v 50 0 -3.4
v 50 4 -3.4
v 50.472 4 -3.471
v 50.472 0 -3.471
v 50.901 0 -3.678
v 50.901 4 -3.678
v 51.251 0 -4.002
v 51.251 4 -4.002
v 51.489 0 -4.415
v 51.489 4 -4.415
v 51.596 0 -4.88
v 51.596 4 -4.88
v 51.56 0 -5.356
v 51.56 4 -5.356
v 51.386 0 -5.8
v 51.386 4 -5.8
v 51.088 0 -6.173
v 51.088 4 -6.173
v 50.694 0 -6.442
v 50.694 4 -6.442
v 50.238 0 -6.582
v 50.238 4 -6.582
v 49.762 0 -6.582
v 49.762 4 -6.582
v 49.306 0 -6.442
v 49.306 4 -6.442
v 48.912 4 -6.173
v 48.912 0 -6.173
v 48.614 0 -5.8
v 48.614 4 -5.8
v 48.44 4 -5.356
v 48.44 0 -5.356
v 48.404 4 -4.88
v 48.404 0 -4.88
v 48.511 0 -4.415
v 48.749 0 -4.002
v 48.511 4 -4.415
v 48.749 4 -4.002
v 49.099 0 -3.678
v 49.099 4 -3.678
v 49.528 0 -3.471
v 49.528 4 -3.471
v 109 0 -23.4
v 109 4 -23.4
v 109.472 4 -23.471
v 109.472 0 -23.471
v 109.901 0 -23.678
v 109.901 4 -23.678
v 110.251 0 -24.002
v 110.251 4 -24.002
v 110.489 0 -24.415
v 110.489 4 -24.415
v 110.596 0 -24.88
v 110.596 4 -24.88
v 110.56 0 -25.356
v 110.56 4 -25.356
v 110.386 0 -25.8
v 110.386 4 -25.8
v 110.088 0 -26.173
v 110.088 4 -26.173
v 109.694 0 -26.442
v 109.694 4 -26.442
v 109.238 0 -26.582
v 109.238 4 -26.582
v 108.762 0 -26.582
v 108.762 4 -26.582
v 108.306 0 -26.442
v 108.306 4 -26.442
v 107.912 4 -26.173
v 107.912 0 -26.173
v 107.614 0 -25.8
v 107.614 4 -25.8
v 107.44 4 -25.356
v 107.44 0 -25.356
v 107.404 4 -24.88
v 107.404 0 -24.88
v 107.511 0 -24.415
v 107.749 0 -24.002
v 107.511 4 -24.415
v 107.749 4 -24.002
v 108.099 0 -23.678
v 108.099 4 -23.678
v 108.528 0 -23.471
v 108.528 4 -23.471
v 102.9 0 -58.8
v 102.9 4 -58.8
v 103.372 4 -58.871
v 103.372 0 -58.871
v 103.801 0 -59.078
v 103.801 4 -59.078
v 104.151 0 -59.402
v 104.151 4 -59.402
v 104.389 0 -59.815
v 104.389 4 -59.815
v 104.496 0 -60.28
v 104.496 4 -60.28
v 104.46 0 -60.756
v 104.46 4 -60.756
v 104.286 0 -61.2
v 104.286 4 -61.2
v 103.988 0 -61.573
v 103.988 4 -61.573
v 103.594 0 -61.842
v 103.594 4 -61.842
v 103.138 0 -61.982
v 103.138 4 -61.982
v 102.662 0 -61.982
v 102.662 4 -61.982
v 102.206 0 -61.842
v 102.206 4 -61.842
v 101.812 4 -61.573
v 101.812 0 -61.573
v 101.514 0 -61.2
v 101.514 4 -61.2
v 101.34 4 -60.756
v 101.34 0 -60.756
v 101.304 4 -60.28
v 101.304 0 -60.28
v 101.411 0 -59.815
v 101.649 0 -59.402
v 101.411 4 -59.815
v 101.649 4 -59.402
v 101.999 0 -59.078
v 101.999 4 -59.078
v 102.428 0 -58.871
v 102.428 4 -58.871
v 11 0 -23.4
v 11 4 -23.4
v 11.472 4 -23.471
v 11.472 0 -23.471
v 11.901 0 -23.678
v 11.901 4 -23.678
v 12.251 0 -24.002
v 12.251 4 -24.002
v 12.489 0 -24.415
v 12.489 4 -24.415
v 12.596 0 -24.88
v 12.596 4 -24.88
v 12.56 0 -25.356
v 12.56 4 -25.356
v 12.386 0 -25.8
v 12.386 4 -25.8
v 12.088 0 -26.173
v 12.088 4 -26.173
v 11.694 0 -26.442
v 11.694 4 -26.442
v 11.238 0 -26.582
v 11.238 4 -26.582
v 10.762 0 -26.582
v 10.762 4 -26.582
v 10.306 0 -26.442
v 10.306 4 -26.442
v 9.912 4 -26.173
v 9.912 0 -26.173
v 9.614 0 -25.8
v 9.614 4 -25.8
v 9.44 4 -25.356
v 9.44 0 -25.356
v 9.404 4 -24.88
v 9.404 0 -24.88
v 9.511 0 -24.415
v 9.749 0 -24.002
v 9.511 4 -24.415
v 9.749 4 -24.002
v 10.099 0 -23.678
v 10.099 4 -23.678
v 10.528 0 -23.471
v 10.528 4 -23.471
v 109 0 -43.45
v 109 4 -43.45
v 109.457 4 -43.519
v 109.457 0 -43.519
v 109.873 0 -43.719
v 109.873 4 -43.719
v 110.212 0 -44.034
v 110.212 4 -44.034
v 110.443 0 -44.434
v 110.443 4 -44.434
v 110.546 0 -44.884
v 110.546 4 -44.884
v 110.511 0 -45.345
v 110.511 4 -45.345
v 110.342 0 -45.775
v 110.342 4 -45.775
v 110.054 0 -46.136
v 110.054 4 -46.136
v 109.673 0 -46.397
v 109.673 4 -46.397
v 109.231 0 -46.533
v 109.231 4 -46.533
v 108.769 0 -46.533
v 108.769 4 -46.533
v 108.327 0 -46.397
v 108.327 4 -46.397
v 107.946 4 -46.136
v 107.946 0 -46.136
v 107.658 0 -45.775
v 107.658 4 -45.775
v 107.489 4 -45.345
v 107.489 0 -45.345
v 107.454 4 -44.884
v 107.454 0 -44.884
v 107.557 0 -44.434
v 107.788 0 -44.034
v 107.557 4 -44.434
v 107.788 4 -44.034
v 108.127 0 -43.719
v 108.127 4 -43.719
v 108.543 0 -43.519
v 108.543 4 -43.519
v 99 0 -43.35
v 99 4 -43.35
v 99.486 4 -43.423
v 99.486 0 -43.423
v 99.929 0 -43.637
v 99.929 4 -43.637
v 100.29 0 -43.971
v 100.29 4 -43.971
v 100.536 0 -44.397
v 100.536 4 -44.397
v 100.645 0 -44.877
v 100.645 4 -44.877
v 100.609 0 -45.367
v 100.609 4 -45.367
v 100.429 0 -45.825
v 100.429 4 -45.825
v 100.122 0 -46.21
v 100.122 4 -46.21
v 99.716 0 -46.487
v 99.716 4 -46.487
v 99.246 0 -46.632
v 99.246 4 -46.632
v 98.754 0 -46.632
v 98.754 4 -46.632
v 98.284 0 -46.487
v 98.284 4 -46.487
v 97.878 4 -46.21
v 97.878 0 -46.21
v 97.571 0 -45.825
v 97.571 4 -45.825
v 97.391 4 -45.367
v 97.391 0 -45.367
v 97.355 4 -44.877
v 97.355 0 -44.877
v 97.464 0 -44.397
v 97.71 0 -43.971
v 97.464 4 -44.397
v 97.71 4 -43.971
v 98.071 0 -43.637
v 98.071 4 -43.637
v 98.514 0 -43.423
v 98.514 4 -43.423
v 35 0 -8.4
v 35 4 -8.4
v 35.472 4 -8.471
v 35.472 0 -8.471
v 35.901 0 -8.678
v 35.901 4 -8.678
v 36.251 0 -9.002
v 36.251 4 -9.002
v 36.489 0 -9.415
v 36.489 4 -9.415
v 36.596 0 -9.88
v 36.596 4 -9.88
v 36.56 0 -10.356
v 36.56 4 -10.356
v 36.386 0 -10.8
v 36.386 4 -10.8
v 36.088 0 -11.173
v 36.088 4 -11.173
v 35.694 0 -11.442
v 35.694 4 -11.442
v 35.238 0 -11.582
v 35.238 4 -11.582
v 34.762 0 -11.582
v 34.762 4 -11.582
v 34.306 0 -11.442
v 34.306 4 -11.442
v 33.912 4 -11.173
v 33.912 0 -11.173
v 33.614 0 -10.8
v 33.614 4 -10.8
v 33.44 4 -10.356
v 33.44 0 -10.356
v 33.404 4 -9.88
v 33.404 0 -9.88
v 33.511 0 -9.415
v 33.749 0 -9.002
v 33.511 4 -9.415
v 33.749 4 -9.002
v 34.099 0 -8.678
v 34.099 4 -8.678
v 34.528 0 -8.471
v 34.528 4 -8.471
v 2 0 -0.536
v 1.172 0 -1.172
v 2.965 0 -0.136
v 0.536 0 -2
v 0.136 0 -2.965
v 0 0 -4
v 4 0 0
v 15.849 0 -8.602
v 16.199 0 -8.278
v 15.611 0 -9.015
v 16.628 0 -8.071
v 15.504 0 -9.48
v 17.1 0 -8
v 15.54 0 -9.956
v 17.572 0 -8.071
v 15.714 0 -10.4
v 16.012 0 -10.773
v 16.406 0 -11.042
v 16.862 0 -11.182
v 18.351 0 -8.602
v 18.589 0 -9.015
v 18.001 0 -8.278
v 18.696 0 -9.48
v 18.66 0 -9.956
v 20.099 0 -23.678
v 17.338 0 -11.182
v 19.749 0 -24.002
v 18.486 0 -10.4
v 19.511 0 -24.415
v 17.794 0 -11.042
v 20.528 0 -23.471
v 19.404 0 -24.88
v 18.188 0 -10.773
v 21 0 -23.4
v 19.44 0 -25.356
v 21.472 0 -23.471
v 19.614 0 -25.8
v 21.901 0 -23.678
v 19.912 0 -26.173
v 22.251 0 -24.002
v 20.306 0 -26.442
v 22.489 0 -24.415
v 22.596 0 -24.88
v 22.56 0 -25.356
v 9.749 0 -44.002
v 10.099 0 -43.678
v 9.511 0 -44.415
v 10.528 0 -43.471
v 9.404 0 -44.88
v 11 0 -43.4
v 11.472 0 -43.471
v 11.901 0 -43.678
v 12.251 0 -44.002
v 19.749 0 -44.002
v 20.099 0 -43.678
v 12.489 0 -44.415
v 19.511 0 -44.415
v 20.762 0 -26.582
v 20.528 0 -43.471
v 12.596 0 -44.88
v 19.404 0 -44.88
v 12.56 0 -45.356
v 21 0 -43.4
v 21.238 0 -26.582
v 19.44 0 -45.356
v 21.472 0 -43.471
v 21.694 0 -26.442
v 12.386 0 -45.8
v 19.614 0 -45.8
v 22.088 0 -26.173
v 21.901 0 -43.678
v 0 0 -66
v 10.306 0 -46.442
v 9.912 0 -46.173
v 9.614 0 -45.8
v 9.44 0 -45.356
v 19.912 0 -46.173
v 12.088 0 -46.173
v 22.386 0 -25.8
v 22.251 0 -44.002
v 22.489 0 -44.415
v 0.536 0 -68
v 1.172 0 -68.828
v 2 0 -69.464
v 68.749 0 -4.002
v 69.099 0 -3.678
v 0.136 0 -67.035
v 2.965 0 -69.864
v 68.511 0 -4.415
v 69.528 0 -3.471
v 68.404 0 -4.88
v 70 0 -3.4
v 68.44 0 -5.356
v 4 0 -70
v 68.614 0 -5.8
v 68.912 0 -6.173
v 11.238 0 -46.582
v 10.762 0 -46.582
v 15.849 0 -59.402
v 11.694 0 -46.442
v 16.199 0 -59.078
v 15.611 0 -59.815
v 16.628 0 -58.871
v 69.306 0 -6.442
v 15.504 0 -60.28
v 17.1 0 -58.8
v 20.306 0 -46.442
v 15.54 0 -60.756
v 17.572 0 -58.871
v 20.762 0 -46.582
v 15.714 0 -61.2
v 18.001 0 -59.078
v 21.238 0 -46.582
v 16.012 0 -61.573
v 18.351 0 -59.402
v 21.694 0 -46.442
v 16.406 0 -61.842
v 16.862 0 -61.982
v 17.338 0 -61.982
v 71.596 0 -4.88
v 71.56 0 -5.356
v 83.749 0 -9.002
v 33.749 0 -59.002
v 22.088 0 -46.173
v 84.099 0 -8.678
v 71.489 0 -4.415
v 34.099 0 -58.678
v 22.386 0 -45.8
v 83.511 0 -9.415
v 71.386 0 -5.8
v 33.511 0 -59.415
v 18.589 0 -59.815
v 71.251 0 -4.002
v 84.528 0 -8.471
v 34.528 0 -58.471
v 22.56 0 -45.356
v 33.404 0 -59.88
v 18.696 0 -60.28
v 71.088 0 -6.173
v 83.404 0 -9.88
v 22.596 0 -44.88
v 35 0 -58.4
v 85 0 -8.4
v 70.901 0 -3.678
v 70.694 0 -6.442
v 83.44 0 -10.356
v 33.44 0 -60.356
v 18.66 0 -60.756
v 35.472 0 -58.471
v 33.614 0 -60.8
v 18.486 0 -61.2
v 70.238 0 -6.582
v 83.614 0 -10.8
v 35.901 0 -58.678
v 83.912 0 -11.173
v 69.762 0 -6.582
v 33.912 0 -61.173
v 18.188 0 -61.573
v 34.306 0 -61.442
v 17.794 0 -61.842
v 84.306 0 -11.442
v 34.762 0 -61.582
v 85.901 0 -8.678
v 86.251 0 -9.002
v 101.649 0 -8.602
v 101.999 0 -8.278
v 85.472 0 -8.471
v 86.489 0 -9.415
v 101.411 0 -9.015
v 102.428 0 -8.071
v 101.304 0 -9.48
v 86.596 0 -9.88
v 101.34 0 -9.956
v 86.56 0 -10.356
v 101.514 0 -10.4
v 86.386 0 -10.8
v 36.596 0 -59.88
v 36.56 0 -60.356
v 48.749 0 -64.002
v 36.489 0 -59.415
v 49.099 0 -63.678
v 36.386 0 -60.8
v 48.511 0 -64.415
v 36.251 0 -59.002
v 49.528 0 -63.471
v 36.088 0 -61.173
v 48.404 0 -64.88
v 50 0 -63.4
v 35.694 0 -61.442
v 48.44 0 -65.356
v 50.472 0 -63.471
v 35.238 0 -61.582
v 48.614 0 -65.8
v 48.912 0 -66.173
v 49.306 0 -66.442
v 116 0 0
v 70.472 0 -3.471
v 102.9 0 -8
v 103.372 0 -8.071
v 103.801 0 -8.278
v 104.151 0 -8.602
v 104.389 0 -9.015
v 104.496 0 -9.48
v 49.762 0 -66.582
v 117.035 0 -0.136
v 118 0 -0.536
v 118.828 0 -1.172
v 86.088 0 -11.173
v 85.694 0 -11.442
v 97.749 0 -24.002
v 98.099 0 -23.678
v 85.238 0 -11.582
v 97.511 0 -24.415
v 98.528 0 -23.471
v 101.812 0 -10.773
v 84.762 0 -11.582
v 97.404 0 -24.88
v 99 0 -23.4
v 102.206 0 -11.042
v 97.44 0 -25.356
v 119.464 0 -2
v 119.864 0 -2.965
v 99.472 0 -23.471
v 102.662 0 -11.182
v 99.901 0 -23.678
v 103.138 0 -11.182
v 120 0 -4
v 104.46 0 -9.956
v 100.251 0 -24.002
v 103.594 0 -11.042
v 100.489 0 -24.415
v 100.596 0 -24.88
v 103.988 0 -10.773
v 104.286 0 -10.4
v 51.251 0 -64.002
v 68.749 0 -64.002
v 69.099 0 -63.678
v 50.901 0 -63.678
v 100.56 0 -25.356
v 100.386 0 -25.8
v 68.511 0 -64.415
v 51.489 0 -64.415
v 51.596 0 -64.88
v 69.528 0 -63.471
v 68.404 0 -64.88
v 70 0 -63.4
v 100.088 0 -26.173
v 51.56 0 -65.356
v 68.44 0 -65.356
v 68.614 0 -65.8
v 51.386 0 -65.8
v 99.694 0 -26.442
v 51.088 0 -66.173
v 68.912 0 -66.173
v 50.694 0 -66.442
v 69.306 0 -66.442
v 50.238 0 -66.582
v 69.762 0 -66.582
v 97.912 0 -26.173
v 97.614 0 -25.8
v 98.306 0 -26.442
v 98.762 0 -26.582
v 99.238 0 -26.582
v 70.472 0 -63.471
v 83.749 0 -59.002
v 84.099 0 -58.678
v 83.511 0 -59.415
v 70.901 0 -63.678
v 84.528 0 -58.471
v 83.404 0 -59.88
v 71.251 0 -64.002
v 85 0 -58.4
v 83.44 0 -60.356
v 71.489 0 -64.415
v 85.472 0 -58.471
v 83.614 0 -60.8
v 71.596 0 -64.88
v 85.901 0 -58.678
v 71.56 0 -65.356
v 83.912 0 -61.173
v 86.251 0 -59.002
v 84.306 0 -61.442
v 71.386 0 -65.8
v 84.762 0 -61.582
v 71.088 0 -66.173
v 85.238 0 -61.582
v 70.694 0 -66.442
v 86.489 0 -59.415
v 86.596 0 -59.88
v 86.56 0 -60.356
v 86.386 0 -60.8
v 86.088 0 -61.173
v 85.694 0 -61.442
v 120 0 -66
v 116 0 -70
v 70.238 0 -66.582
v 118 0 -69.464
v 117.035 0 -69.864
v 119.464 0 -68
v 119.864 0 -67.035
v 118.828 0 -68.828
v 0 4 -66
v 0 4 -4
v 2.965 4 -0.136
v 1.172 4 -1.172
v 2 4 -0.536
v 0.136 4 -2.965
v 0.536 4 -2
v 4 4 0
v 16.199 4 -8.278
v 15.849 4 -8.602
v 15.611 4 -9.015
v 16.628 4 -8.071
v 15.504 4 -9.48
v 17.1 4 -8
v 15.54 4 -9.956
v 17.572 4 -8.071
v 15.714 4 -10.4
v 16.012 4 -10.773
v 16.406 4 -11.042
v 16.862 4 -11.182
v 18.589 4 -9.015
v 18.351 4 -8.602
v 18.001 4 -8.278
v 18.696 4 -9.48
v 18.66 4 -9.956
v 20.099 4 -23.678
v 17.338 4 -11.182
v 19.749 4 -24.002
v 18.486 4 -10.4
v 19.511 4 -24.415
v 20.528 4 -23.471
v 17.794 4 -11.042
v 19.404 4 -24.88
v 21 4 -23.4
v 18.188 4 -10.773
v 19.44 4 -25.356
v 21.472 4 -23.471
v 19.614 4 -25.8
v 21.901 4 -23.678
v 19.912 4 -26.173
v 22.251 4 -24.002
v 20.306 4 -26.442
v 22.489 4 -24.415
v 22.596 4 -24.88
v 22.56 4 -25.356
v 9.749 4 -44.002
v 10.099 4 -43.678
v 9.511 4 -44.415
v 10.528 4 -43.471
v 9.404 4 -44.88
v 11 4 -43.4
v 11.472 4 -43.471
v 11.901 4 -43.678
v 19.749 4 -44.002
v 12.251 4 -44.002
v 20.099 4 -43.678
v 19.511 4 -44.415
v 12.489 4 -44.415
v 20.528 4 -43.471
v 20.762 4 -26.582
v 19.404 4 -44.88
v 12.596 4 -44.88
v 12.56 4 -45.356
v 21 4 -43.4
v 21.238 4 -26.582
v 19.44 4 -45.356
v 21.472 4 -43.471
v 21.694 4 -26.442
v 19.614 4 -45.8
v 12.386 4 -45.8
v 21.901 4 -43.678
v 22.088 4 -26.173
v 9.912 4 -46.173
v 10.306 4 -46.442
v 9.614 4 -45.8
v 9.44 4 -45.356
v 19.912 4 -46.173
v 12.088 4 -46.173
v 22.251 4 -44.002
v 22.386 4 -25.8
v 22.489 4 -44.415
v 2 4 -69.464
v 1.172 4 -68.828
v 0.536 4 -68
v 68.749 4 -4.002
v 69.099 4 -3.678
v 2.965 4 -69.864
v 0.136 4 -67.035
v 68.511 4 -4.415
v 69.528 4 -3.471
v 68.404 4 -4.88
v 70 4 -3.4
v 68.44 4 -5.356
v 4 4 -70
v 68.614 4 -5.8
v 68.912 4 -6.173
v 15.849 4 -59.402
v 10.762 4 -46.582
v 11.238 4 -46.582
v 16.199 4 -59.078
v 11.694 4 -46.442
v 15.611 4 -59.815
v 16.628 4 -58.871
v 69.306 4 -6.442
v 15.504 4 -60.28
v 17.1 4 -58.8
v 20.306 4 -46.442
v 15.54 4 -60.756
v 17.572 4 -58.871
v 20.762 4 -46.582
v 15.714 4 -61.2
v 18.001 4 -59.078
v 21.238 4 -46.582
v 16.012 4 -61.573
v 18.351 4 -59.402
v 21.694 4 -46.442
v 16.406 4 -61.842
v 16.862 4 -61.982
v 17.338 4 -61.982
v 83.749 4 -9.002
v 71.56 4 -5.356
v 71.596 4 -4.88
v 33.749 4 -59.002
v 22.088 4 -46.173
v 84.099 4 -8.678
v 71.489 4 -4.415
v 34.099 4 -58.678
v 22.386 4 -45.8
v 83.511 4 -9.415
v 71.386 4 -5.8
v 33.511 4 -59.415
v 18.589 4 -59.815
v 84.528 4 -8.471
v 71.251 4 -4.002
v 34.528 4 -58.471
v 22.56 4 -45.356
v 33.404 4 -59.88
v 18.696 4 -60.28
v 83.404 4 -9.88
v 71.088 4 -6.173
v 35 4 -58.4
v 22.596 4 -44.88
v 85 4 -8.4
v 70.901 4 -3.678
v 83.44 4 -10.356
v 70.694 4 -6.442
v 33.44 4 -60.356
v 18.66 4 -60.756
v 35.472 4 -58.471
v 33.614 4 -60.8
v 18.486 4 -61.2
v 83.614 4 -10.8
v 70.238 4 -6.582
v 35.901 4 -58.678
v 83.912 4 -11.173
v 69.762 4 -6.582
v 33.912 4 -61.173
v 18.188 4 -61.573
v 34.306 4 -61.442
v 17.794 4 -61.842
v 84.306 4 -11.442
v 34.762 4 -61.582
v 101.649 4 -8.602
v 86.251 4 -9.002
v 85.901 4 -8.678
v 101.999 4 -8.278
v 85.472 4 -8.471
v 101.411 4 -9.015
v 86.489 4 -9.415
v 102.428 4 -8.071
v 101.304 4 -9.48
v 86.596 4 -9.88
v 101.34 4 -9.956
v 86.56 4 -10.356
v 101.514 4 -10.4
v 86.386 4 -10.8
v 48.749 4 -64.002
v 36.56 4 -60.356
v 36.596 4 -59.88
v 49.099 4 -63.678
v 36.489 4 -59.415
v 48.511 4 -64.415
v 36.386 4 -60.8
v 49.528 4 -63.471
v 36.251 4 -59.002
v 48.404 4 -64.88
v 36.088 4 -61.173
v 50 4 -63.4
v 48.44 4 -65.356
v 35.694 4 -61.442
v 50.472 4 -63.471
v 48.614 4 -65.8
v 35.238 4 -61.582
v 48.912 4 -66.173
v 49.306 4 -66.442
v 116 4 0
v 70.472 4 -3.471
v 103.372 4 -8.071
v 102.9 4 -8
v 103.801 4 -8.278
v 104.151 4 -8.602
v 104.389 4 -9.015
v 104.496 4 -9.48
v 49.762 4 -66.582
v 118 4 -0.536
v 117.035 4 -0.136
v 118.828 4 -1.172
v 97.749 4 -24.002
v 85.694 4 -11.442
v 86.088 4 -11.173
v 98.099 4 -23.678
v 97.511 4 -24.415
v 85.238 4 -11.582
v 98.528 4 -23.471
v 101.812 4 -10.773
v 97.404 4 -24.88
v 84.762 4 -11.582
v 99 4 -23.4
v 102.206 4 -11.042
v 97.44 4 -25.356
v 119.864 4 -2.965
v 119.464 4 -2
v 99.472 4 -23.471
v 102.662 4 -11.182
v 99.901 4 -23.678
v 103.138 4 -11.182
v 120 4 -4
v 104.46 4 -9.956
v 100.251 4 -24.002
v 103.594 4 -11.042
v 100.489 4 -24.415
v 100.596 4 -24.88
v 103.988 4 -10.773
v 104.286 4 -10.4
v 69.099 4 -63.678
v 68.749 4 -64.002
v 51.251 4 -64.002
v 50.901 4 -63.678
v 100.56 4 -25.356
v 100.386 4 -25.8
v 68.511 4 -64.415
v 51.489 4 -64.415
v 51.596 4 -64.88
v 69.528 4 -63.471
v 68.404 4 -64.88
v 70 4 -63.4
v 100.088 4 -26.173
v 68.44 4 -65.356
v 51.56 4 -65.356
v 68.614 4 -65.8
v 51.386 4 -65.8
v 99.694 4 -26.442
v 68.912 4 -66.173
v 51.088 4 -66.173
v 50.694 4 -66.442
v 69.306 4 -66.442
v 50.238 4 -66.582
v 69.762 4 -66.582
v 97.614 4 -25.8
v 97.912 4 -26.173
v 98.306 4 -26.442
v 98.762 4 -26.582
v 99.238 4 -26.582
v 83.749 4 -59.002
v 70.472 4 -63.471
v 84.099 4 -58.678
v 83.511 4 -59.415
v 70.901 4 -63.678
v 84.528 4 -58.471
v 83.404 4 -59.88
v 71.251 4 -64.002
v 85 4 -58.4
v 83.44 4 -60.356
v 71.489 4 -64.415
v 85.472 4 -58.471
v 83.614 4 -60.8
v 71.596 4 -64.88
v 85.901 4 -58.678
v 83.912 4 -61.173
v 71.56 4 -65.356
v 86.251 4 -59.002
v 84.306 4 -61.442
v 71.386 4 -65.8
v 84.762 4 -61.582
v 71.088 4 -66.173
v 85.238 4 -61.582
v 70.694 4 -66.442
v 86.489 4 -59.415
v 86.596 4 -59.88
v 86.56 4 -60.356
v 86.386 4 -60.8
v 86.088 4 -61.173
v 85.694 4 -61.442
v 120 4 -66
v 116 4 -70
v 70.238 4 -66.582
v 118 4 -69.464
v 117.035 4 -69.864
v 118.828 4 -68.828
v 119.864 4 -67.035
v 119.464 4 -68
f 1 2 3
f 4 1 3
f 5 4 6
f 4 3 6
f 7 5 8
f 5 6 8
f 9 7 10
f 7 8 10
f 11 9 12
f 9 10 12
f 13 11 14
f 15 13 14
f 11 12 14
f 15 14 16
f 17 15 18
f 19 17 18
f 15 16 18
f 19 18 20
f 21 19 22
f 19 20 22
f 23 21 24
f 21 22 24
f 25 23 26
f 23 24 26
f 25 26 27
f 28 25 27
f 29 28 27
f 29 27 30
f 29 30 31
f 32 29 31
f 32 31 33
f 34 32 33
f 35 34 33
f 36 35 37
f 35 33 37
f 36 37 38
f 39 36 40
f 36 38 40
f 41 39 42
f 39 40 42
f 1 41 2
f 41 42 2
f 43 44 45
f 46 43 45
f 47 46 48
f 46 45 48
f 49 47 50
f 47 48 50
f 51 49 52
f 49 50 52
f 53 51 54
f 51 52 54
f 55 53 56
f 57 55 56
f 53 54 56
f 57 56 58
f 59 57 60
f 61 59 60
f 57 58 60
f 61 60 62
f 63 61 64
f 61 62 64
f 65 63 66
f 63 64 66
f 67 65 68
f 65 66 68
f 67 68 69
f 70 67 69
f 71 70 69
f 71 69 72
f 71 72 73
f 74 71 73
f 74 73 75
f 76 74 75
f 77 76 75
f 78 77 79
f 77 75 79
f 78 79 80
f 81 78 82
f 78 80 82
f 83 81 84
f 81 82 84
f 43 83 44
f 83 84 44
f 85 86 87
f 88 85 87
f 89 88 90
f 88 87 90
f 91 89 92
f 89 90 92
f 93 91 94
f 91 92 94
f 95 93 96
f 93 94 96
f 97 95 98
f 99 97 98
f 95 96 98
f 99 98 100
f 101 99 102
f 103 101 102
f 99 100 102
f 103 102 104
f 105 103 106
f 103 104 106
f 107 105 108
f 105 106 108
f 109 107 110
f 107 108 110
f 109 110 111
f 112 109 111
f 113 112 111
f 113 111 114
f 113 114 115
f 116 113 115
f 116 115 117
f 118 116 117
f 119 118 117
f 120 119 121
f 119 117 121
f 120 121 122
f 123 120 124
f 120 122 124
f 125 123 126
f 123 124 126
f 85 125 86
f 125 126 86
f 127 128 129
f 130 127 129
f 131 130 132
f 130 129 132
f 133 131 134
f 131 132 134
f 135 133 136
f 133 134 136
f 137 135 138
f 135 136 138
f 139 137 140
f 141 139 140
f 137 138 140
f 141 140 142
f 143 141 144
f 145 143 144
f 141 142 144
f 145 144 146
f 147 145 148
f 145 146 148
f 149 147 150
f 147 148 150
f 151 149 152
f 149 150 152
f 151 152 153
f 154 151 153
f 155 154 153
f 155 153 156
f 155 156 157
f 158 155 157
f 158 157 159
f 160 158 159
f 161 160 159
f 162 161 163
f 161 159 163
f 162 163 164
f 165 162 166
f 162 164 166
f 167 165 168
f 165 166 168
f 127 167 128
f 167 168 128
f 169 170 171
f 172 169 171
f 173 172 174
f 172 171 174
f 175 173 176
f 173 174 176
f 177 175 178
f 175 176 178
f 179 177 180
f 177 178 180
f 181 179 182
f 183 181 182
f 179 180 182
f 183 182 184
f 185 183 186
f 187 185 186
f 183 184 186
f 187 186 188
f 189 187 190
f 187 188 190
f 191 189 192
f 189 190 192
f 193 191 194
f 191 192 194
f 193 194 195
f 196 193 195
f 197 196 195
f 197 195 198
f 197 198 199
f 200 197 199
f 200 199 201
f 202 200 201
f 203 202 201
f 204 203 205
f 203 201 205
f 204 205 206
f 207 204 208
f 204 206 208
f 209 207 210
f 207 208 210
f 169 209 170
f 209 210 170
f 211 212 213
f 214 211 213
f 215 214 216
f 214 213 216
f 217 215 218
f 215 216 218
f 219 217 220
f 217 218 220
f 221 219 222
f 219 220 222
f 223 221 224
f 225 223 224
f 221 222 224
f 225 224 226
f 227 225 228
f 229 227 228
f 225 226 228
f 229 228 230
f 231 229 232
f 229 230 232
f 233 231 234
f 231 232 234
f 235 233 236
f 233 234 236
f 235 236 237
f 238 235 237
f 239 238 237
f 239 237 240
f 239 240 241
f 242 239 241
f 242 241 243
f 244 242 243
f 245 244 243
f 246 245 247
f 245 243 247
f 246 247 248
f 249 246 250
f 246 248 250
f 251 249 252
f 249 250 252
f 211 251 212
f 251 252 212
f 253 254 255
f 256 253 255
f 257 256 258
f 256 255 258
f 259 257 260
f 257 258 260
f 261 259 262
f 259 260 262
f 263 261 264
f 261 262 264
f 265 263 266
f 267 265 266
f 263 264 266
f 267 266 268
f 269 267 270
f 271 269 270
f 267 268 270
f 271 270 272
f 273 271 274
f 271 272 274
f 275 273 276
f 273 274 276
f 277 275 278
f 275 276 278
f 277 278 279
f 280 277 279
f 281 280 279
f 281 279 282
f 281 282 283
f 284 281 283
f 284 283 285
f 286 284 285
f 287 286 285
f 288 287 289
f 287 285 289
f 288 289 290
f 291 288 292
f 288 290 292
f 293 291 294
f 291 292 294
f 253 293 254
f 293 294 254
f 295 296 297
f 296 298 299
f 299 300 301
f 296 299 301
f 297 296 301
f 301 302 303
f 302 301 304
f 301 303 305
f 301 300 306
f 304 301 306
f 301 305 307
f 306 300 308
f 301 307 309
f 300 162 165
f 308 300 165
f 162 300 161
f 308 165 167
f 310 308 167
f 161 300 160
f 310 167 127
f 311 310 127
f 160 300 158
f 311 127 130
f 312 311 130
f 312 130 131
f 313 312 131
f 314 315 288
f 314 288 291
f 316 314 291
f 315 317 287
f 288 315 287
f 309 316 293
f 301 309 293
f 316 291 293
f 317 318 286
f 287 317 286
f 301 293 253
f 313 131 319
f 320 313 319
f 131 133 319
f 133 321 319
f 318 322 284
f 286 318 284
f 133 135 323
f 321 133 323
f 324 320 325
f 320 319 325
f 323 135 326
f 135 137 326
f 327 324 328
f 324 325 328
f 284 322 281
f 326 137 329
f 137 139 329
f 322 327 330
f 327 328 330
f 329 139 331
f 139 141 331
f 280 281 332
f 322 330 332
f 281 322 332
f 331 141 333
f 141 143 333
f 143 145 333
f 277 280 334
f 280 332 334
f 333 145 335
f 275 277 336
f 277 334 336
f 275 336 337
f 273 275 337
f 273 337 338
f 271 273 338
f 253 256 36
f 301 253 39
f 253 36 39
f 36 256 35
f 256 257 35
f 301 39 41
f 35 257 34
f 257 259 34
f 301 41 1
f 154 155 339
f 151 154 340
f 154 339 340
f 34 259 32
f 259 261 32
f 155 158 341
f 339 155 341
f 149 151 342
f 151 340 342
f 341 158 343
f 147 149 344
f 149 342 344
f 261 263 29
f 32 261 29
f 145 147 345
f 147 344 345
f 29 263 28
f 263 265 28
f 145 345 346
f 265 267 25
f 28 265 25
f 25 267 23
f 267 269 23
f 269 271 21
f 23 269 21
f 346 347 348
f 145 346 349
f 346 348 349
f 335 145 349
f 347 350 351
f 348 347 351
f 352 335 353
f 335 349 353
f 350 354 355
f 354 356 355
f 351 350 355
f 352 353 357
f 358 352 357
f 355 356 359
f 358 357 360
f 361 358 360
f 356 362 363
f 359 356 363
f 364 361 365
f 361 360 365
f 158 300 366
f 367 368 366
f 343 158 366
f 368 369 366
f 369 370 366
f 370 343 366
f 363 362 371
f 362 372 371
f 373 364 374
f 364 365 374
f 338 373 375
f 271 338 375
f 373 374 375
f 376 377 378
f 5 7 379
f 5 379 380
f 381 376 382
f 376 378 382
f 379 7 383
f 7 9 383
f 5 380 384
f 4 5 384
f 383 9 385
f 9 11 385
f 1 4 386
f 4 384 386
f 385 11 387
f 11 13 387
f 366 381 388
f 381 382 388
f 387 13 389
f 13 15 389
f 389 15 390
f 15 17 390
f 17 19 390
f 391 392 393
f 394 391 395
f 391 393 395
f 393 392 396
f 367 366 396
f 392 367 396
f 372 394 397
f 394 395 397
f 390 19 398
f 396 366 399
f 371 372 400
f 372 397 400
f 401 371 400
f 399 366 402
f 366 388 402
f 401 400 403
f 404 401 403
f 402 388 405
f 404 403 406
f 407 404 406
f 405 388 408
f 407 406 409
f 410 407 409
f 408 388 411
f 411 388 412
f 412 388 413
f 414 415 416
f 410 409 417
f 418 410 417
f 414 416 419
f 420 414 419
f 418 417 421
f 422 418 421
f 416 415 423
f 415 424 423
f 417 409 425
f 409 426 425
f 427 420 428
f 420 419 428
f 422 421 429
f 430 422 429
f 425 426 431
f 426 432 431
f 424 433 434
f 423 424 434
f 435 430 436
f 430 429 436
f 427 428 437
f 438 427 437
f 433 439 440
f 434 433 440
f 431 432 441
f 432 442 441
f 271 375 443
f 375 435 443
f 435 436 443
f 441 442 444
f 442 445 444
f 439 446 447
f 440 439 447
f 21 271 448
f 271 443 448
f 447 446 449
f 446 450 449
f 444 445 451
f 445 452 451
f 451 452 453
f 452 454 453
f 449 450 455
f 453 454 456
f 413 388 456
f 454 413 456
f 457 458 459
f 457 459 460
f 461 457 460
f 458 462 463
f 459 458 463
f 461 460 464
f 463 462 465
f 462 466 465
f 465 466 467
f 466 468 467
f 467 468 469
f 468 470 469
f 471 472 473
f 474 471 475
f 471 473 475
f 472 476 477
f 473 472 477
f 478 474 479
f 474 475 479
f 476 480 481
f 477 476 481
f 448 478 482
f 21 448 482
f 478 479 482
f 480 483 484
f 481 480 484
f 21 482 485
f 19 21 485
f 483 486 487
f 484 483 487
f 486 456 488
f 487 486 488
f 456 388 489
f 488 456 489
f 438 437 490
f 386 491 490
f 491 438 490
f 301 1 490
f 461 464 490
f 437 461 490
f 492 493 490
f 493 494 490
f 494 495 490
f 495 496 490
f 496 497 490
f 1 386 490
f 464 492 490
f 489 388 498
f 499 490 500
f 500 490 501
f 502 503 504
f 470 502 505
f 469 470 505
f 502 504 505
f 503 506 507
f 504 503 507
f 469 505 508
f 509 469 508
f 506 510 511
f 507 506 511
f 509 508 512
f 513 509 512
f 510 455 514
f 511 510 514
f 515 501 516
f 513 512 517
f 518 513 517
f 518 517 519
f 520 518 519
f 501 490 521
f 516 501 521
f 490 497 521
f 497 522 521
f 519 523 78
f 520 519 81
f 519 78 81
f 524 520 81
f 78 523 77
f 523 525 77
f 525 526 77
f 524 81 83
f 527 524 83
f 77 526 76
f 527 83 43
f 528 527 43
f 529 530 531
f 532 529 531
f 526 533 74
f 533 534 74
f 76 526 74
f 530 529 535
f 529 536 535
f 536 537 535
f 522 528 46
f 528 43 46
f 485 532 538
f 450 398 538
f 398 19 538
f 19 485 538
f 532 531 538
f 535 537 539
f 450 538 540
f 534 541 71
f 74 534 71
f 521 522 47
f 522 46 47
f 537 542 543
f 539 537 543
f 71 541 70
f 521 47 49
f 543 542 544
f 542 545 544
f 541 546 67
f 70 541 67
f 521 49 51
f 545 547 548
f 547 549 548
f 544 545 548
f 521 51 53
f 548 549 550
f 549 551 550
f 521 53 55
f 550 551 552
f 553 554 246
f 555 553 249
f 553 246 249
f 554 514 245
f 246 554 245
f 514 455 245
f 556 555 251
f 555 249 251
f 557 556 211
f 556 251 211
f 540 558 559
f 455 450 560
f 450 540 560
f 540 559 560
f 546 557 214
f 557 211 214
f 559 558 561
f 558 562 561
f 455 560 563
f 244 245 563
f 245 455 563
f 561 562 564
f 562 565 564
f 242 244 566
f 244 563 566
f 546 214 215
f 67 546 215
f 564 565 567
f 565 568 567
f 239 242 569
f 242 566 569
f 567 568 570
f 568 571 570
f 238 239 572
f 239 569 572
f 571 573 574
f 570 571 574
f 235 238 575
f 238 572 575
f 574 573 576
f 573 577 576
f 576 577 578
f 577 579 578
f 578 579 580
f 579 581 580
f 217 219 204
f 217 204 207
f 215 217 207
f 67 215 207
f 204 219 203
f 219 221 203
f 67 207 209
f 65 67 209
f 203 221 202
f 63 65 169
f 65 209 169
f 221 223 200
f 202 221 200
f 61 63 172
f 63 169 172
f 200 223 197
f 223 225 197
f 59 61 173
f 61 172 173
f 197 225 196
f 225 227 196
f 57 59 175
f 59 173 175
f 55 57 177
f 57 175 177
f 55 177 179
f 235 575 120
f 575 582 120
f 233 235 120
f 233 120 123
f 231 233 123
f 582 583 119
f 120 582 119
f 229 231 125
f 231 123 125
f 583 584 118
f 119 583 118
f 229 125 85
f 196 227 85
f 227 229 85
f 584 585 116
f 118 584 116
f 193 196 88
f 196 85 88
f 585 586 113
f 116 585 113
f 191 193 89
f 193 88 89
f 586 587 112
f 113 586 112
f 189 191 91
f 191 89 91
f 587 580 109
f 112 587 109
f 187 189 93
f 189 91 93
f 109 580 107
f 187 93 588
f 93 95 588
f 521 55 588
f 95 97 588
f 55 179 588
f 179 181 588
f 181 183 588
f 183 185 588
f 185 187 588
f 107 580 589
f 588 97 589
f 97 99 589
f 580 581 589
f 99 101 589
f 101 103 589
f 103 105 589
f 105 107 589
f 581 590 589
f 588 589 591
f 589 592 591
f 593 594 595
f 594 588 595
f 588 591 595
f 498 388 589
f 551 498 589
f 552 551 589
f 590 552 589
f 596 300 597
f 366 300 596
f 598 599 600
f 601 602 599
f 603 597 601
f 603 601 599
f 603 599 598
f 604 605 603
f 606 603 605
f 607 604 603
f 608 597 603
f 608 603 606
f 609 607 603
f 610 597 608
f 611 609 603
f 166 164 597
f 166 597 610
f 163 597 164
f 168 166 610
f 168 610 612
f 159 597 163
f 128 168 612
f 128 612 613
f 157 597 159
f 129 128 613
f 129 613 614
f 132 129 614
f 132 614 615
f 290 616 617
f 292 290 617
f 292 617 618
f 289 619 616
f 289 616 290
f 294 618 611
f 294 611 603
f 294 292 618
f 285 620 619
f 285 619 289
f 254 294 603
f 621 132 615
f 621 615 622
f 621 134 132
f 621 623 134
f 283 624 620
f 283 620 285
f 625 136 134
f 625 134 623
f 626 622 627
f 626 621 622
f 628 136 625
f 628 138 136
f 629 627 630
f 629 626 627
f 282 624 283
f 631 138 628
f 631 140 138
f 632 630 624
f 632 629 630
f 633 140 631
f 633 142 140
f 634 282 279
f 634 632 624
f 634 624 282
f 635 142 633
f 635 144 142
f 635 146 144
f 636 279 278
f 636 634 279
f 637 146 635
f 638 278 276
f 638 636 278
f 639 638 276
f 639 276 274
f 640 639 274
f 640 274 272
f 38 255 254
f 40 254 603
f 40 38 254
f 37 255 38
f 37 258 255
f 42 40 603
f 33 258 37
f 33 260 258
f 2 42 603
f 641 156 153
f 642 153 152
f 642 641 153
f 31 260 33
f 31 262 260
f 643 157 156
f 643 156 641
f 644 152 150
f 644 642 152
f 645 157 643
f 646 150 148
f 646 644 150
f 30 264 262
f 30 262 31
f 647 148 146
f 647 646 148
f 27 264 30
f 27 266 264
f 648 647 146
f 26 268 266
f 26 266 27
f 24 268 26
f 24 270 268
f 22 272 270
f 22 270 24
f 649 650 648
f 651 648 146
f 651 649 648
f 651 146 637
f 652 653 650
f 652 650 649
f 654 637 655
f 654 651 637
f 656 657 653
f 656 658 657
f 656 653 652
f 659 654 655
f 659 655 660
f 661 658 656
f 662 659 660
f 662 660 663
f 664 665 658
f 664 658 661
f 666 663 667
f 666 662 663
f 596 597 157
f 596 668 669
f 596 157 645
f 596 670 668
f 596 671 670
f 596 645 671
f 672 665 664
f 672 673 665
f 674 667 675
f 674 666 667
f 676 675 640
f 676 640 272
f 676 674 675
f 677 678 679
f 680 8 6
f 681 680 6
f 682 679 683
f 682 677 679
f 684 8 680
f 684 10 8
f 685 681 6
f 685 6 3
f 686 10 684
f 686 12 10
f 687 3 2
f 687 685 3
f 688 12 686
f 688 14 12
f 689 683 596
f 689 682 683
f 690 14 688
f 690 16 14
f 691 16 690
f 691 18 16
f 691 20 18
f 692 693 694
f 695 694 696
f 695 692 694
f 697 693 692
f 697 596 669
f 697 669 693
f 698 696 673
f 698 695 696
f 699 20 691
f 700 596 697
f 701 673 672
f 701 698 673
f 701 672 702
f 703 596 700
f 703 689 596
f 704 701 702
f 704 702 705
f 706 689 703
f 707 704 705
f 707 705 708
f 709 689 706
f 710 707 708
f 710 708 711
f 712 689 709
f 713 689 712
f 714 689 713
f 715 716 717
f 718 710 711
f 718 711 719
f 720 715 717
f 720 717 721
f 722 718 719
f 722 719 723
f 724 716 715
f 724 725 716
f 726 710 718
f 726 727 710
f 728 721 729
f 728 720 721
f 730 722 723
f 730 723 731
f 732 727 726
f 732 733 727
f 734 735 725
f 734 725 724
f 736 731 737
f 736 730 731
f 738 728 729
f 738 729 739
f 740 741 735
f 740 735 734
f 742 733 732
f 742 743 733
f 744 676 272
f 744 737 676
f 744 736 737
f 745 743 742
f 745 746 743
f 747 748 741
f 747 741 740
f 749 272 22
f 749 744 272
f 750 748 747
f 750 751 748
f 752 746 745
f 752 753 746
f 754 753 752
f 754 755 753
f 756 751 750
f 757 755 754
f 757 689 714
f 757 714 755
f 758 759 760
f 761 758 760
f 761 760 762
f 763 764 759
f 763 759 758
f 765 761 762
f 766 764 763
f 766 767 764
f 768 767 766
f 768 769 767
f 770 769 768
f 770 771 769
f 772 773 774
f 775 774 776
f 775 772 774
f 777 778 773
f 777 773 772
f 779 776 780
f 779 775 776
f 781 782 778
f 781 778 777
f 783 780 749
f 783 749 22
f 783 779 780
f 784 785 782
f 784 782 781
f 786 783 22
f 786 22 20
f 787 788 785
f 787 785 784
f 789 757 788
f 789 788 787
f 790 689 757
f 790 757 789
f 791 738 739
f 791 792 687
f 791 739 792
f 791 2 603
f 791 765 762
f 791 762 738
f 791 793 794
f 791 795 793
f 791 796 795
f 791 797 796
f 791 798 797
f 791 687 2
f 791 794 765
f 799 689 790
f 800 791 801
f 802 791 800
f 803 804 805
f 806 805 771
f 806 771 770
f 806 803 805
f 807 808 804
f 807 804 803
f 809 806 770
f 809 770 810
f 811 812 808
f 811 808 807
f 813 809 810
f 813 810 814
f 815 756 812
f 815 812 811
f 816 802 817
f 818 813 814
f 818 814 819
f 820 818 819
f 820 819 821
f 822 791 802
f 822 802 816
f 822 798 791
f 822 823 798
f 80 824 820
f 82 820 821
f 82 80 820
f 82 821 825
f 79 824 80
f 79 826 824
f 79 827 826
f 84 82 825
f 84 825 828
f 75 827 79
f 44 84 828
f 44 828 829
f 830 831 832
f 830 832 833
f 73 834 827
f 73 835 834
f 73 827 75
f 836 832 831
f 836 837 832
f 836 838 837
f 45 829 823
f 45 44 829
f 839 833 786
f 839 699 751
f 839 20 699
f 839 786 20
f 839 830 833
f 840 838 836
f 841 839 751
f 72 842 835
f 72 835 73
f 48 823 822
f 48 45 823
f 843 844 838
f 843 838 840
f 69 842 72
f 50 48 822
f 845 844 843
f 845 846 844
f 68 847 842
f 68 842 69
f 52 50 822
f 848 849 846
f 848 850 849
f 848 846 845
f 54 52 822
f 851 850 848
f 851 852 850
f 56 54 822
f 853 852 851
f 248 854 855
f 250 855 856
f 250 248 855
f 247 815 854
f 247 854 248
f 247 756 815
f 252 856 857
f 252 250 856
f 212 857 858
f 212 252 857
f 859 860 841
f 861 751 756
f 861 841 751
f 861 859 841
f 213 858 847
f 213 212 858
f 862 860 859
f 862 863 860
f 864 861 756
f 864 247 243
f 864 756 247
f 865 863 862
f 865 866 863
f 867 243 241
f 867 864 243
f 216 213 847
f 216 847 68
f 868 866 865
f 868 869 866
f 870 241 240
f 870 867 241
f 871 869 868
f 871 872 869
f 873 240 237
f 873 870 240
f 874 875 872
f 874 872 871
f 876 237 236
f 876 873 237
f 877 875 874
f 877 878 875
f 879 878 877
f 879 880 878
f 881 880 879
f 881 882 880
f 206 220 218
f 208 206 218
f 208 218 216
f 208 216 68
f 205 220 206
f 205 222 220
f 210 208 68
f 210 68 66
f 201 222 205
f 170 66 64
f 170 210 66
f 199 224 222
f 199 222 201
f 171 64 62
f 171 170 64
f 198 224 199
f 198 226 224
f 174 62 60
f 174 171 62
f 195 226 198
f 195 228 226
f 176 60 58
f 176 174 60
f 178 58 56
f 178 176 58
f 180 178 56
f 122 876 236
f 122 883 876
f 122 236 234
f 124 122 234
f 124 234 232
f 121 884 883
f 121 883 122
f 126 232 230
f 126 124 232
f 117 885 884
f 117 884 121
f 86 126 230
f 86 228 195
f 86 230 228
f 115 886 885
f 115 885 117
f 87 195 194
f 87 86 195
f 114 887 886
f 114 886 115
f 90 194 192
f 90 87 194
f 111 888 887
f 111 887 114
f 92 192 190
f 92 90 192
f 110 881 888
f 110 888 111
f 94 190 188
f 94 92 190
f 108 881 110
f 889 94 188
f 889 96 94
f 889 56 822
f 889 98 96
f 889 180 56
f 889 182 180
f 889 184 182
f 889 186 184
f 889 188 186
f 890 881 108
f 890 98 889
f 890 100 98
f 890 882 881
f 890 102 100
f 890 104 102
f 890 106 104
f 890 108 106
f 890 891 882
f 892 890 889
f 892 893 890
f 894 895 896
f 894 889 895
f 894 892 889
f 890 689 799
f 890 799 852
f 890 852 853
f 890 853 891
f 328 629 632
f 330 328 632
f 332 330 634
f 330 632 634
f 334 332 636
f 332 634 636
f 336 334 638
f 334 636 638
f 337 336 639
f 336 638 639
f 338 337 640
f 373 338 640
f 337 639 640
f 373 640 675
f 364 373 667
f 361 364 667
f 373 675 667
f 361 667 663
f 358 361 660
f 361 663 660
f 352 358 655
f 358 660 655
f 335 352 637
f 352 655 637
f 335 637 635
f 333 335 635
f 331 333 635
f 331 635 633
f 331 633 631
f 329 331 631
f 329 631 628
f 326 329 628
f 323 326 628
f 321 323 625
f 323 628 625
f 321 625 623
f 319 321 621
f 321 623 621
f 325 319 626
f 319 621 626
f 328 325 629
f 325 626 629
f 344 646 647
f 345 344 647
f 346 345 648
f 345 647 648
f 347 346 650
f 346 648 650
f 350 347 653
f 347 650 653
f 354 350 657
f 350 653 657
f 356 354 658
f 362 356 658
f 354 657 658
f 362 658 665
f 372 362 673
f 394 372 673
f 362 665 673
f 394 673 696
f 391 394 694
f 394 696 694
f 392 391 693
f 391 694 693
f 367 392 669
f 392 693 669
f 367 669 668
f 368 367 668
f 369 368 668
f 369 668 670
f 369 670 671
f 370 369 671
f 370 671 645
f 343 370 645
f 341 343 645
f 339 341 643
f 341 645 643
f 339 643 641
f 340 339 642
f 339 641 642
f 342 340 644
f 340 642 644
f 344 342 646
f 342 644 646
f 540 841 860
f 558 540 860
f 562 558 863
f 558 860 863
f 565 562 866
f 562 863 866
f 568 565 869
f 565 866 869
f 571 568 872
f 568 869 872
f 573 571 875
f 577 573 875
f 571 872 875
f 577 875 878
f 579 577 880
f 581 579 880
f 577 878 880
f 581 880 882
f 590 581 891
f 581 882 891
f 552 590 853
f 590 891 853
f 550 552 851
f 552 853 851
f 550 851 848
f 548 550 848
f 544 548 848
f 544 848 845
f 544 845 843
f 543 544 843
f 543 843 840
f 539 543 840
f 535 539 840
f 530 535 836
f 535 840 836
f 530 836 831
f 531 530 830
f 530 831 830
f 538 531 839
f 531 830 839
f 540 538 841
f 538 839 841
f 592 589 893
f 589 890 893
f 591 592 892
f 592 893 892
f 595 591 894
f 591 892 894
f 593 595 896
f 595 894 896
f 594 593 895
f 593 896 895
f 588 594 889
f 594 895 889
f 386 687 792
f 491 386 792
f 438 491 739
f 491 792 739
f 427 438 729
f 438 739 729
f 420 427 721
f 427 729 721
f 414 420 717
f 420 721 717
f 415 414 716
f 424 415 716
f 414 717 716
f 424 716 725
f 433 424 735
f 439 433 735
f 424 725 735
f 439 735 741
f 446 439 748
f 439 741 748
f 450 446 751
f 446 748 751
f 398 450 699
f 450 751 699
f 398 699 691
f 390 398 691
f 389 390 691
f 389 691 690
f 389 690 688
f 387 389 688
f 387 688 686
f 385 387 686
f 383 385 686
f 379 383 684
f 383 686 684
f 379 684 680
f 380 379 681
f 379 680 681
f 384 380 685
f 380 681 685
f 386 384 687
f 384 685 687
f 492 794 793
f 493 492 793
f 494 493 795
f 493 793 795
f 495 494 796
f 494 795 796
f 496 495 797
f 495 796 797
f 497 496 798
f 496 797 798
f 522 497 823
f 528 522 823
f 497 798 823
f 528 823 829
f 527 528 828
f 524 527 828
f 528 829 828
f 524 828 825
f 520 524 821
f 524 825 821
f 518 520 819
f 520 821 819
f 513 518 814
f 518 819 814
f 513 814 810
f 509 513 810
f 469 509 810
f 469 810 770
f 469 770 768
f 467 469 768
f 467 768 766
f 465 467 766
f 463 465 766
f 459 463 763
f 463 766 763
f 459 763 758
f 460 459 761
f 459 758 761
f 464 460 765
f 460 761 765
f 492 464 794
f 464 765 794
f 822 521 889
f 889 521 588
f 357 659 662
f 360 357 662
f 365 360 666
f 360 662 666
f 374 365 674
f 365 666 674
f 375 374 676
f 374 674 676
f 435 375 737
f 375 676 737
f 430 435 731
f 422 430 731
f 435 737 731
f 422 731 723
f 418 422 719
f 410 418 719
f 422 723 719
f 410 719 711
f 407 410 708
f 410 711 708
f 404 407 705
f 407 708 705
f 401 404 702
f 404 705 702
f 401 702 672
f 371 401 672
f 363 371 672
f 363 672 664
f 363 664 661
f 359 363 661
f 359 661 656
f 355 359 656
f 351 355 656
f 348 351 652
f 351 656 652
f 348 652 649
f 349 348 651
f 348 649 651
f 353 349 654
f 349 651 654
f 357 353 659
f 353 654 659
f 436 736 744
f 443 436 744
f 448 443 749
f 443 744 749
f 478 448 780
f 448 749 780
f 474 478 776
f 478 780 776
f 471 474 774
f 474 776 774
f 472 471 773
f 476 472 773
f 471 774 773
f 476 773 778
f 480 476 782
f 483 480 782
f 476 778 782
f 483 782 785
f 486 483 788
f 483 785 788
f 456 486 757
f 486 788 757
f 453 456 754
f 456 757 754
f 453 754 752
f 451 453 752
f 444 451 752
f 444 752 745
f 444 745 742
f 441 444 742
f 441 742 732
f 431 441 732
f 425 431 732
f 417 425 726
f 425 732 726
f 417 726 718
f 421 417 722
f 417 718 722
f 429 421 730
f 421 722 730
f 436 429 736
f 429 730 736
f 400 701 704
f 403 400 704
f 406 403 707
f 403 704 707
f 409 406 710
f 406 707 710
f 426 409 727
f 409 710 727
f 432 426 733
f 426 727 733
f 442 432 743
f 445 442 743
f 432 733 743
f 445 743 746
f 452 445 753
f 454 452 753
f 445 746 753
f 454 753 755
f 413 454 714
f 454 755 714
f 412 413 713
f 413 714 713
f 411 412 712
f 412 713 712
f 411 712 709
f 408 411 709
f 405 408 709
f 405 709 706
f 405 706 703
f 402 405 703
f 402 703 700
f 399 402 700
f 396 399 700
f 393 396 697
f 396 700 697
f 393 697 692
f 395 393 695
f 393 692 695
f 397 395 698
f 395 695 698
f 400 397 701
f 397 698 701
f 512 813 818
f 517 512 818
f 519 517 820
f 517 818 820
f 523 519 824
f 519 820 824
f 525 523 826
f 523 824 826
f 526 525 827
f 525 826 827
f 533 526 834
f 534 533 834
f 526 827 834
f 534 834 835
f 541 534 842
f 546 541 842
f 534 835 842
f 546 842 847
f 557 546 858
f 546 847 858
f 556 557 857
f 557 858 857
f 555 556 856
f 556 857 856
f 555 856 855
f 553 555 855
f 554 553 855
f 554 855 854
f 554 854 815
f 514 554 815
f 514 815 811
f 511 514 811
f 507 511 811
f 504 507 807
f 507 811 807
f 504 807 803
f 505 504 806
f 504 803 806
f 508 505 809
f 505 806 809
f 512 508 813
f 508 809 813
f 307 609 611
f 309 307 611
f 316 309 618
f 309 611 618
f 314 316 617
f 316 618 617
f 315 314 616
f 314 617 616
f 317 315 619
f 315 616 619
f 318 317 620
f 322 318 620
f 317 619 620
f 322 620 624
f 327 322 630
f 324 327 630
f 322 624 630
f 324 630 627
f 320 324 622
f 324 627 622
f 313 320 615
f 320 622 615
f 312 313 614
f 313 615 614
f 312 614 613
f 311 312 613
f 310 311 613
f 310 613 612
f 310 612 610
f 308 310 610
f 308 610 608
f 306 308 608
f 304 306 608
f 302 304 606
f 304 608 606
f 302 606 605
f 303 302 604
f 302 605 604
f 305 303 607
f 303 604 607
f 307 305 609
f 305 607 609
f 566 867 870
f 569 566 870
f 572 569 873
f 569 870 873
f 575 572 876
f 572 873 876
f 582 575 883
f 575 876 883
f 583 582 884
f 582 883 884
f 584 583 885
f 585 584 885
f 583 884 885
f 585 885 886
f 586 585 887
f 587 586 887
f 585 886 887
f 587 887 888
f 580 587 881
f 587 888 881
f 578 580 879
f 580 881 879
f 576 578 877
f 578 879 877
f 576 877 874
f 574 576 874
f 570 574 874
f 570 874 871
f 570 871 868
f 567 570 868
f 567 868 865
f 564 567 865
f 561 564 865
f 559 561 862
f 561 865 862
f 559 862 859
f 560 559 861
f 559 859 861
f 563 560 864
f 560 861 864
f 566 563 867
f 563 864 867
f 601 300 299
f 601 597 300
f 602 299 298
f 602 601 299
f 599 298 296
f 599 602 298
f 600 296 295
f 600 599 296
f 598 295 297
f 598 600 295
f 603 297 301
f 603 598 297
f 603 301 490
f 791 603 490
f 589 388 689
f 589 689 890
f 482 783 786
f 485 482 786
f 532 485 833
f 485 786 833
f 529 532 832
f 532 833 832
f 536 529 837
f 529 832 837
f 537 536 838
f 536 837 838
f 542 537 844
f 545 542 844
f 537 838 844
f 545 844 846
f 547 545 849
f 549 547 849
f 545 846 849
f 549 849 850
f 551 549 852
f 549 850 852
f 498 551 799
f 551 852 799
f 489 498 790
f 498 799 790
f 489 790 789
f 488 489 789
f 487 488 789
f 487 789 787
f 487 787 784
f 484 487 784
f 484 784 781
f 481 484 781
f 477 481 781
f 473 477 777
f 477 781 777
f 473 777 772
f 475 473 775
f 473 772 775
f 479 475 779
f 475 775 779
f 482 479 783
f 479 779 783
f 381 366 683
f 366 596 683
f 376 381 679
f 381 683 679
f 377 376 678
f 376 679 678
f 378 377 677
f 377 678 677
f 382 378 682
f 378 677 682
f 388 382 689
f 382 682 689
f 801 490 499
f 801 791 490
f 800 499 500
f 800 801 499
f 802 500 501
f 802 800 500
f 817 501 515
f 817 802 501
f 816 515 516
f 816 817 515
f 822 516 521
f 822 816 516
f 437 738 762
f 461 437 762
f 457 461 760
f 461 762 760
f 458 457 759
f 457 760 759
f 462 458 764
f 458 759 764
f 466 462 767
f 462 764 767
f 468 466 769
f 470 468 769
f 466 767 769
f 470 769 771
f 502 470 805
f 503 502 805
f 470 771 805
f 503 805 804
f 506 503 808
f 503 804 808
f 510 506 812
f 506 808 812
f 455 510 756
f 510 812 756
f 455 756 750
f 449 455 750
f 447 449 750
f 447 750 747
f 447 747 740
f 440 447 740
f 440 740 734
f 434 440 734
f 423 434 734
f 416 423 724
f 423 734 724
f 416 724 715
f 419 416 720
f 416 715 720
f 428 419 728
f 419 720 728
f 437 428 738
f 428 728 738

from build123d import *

# Parameters (mm, degrees)
SKETCH_1_W          = 120
SKETCH_1_H          = 70
EXTRUDE_1_DEPTH     = 4
SKETCH_2_R          = 1.6
SKETCH_2_R_2        = 1.55
SKETCH_2_R_3        = 1.65
CUT_EXTRUDE_1_DEPTH = 4
SKETCH_3_R          = 1.6
CUT_EXTRUDE_2_DEPTH = 4
FILLET_1_R          = 4


with BuildPart() as part:
    # 草图1 → 凸台-拉伸1 (new body)
    with BuildSketch(Plane(origin=(0, 0, 0), x_dir=(1, 0, 0), z_dir=(0, 1, 0))):
        with Locations((60, 35)):
            Rectangle(SKETCH_1_W, SKETCH_1_H)
    extrude(amount=EXTRUDE_1_DEPTH)

    # 草图2 → 切除-拉伸1 (cut)
    with BuildSketch(Plane(origin=(0, 4, 0), x_dir=(1, 0, 0), z_dir=(0, 1, 0))):
        with Locations(Location((11, 45, 0), (0, 0, 270))):
            Circle(SKETCH_2_R)
        with Locations(Location((21, 45, 0), (0, 0, 270))):
            Circle(SKETCH_2_R)
        with Locations(Location((21, 25, 0), (0, 0, 270))):
            Circle(SKETCH_2_R)
        with Locations(Location((11, 25, 0), (0, 0, 270))):
            Circle(SKETCH_2_R)
        with Locations(Location((109, 45, 0), (0, 0, 270))):
            Circle(SKETCH_2_R_2)
        with Locations(Location((99, 45, 0), (0, 0, 270))):
            Circle(SKETCH_2_R_3)
        with Locations(Location((109, 25, 0), (0, 0, 270))):
            Circle(SKETCH_2_R)
        with Locations(Location((99, 25, 0), (0, 0, 270))):
            Circle(SKETCH_2_R)
        with Locations(Location((102.9, 9.6, 0), (0, 0, 270))):
            Circle(SKETCH_2_R)
        with Locations(Location((17.1, 9.6, 0), (0, 0, 270))):
            Circle(SKETCH_2_R)
        with Locations(Location((17.1, 60.4, 0), (0, 0, 270))):
            Circle(SKETCH_2_R)
        with Locations(Location((102.9, 60.4, 0), (0, 0, 270))):
            Circle(SKETCH_2_R)
        with Locations(Location((85, 60, 0), (0, 0, 270))):
            Circle(SKETCH_2_R)
        with Locations(Location((85, 10, 0), (0, 0, 270))):
            Circle(SKETCH_2_R)
        with Locations(Location((35, 10, 0), (0, 0, 270))):
            Circle(SKETCH_2_R)
        with Locations(Location((35, 60, 0), (0, 0, 270))):
            Circle(SKETCH_2_R)
    extrude(amount=-CUT_EXTRUDE_1_DEPTH, mode=Mode.SUBTRACT)

    # 草图3 → 切除-拉伸2 (cut)
    with BuildSketch(Plane(origin=(0, 4, 0), x_dir=(1, 0, 0), z_dir=(0, 1, 0))):
        with Locations(Location((50, 5, 0), (0, 0, 270))):
            Circle(SKETCH_3_R)
        with Locations(Location((70, 5, 0), (0, 0, 270))):
            Circle(SKETCH_3_R)
        with Locations(Location((50, 65, 0), (0, 0, 270))):
            Circle(SKETCH_3_R)
        with Locations(Location((70, 65, 0), (0, 0, 270))):
            Circle(SKETCH_3_R)
    extrude(amount=-CUT_EXTRUDE_2_DEPTH, mode=Mode.SUBTRACT)

    # 圆角1
    fillet_1_edges = [part.edges().sort_by_distance(p)[0] for p in [
        (0, 2, -70),
        (120, 2, -70),
        (120, 2, 0),
        (0, 2, 0),
    ]]
    fillet(fillet_1_edges, radius=FILLET_1_R)


solid = part.part
